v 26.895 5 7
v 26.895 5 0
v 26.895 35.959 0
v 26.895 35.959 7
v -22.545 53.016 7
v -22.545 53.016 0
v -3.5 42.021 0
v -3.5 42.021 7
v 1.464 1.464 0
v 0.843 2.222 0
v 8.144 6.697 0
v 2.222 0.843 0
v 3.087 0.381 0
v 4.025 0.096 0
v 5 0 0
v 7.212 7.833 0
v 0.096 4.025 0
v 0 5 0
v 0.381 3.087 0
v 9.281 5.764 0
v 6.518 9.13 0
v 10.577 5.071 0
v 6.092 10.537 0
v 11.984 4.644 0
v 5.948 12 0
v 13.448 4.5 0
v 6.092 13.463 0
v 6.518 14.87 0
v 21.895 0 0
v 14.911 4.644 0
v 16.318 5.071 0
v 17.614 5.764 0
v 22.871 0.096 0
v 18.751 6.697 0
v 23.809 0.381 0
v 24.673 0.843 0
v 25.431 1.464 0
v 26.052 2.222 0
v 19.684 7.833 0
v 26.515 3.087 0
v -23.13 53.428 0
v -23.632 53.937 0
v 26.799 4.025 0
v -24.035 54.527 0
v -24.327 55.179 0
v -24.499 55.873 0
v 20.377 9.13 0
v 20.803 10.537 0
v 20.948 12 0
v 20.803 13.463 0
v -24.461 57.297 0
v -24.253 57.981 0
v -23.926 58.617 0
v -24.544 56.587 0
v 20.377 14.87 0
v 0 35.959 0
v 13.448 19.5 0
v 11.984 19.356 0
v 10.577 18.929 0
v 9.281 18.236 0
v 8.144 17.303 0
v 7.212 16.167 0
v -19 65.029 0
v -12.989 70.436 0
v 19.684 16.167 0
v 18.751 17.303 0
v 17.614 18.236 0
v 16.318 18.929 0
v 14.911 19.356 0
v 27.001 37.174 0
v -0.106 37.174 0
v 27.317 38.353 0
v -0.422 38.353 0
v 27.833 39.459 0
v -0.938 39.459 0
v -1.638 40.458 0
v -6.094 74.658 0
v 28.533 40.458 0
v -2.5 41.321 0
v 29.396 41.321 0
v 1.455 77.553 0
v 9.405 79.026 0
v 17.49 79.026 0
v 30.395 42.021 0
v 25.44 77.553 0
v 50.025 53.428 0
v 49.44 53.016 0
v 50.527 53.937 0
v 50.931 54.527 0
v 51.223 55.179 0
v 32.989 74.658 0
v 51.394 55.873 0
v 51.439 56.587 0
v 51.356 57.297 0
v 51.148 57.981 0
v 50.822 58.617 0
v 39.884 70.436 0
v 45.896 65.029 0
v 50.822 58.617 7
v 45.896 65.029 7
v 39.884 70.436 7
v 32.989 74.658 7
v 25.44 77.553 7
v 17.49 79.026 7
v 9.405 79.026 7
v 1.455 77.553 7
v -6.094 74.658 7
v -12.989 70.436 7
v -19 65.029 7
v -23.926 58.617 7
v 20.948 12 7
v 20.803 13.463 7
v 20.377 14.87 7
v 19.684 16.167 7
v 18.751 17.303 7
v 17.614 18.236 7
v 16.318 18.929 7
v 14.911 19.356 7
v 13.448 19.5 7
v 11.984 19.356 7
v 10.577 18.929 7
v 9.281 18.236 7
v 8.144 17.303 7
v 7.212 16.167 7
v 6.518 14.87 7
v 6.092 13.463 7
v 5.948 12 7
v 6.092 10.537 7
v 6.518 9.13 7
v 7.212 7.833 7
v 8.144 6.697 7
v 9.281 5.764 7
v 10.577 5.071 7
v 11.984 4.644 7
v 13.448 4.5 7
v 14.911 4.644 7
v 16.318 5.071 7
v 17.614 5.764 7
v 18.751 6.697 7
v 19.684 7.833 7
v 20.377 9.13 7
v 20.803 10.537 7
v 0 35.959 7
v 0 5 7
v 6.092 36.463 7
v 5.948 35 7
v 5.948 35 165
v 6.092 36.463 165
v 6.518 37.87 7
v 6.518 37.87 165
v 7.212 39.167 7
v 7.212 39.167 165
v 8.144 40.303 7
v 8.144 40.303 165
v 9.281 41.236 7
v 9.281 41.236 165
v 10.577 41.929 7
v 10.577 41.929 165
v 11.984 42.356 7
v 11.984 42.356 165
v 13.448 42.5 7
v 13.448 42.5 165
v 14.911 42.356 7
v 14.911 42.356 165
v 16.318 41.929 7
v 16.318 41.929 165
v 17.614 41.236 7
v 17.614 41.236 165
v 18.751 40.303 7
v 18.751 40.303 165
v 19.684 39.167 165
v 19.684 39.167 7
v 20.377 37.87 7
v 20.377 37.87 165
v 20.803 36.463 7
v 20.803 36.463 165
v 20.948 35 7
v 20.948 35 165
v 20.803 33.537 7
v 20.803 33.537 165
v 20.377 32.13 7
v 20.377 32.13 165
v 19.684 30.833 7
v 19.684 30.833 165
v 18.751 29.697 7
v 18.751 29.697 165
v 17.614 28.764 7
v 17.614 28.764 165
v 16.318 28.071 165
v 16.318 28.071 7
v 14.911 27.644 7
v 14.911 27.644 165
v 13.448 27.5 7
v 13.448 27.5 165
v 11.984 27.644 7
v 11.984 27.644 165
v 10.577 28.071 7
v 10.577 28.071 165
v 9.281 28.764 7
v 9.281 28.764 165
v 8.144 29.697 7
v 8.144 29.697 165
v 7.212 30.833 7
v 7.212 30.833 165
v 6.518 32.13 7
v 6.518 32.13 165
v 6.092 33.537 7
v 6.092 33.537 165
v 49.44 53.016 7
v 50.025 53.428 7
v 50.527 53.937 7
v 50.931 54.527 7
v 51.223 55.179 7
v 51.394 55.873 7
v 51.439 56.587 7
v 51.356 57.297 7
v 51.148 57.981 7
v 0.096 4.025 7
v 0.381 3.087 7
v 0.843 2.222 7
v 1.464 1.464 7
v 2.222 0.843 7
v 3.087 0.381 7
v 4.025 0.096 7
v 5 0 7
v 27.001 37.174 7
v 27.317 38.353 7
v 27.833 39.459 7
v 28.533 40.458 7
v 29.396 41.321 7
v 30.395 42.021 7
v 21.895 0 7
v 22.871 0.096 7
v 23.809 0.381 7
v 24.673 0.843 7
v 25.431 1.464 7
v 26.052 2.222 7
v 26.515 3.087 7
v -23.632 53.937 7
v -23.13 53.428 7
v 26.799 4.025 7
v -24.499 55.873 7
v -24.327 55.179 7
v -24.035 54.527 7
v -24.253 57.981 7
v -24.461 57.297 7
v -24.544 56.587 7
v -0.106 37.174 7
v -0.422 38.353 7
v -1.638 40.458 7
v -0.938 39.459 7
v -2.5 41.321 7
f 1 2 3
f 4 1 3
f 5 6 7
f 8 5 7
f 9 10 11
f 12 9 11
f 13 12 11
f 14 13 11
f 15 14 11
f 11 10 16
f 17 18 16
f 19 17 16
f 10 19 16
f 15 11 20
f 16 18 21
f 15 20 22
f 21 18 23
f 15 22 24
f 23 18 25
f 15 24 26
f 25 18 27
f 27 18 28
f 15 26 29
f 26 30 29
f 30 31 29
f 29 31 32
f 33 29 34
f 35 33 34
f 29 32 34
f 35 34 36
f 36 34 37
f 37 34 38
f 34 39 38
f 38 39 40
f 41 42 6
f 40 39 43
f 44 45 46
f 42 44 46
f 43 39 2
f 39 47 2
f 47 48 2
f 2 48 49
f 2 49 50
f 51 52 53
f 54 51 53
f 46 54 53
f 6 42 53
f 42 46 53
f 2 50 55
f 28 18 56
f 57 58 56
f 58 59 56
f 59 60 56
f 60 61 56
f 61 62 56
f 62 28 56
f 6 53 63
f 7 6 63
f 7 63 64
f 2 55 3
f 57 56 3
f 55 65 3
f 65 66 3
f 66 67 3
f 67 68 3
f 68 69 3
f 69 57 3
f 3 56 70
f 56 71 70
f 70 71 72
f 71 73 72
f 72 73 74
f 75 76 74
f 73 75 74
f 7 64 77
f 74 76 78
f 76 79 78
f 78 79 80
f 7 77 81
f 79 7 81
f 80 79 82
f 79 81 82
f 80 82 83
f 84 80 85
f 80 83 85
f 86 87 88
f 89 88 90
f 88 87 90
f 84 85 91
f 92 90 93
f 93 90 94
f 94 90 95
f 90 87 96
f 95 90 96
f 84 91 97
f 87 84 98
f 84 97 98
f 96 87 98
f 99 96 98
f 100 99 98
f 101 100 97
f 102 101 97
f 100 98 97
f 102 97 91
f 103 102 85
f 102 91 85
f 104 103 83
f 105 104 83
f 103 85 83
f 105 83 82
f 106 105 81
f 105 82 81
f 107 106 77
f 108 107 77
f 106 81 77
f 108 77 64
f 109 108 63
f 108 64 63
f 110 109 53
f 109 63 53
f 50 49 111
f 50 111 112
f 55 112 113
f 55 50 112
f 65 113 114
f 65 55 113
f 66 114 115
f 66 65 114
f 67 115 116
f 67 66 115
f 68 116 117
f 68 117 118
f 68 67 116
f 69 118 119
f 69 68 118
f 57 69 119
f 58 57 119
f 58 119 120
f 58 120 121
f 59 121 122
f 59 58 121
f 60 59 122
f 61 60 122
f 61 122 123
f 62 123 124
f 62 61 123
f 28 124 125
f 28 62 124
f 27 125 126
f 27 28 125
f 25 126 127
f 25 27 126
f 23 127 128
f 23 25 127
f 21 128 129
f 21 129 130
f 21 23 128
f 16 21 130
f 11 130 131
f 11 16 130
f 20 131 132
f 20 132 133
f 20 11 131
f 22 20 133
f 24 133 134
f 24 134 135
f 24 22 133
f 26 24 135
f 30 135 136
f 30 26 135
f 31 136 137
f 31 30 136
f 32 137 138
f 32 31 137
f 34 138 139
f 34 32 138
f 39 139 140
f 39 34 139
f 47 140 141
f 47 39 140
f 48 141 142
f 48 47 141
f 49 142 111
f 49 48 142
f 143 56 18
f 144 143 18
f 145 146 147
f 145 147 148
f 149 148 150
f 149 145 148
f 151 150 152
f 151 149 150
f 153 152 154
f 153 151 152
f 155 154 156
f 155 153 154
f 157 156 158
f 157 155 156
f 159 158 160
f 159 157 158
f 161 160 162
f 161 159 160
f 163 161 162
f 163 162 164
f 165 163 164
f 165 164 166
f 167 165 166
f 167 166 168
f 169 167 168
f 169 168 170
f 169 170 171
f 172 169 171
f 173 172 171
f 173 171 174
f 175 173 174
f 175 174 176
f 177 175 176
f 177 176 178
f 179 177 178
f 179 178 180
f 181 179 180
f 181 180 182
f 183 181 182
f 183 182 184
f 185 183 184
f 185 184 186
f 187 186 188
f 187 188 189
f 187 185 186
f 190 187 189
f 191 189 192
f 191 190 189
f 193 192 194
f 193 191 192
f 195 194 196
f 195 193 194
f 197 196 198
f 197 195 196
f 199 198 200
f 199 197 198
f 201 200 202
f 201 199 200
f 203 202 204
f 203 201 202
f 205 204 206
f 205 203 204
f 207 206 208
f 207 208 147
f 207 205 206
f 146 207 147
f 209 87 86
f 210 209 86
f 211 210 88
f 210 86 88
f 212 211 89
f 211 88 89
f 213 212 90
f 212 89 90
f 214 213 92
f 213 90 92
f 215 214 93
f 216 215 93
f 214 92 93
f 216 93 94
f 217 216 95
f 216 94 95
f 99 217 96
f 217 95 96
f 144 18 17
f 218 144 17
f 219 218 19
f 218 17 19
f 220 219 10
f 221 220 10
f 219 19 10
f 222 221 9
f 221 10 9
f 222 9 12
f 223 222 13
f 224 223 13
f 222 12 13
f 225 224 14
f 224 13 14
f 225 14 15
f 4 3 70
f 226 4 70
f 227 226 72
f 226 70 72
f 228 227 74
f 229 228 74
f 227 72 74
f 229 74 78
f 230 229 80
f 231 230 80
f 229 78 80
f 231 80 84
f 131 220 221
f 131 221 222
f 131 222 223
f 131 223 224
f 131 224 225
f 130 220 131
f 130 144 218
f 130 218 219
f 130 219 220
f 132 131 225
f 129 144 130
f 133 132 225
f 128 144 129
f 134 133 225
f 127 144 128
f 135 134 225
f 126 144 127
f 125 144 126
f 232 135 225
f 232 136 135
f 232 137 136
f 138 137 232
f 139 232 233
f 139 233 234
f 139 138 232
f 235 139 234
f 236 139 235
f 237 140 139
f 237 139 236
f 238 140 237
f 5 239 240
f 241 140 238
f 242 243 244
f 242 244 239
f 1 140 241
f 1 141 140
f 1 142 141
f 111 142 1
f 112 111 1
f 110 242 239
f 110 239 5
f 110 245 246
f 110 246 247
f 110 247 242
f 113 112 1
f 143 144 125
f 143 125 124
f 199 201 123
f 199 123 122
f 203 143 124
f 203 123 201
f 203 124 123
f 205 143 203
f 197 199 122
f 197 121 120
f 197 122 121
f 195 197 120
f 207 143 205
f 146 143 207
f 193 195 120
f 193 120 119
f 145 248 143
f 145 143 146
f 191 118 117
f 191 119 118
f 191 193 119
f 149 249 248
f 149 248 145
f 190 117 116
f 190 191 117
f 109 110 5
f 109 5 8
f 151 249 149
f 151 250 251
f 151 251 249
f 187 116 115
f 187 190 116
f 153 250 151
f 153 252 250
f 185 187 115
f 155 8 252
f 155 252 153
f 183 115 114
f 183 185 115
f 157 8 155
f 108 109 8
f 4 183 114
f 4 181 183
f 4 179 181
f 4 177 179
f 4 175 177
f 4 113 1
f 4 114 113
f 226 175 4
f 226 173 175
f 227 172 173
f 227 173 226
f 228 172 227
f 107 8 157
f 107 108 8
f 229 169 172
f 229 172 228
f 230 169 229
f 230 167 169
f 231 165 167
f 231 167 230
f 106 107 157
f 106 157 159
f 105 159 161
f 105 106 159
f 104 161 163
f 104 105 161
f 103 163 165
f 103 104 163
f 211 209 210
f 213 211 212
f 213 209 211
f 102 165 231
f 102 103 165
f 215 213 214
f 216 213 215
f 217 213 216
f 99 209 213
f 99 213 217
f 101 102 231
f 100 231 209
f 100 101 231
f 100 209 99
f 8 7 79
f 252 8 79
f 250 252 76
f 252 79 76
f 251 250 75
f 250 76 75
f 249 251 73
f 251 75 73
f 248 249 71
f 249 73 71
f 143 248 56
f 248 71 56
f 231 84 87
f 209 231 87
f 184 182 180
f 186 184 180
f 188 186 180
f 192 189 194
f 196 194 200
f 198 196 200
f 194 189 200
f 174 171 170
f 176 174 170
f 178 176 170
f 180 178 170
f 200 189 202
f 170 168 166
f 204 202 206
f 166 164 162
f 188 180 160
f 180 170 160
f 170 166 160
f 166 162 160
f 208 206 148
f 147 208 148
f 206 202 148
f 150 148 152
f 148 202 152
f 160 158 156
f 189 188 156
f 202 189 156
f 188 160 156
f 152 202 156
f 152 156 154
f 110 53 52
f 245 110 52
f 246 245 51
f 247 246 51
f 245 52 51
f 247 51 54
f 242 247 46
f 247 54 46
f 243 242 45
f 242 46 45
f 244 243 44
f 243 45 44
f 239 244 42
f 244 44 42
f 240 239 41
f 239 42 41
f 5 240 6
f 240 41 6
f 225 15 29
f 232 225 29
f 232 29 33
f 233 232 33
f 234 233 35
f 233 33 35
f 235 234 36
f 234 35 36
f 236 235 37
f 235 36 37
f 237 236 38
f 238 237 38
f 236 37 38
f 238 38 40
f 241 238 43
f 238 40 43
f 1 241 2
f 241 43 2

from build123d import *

# Parameters (mm, degrees)
SKETCH2_R           = 7.5
BOSS_EXTRUDE5_DEPTH = 7
SKETCH5_R           = 7.5
BOSS_EXTRUDE6_DEPTH = 165


with BuildPart() as part:
    # Sketch2 → Boss-Extrude5 (new body)
    with BuildSketch(Plane.XY):
        with BuildLine():
            Line((5, 0), (21.89510984, 0))
            ThreePointArc((21.89510984, 0), (25.430643746, 1.464466094), (26.89510984, 5))
            Line((26.89510984, 5), (26.89510984, 35.958548116))
            ThreePointArc((26.89510984, 35.958548116), (27.832932013, 39.458548116), (30.39510984, 42.020725942))
            Line((30.39510984, 42.020725942), (49.440130583, 53.016373795))
            ThreePointArc((49.440130583, 53.016373795), (51.323745621, 55.522595335), (50.821570497, 58.61726368))
            ThreePointArc((50.821570497, 58.61726368), (13.44755492, 79.210770001), (-23.926460657, 58.61726368))
            ThreePointArc((-23.926460657, 58.61726368), (-24.428635781, 55.522595335), (-22.545020743, 53.016373795))
            Line((-22.545020743, 53.016373795), (-3.5, 42.020725942))
            ThreePointArc((-3.5, 42.020725942), (-0.937822174, 39.458548116), (0, 35.958548116))
            Line((0, 35.958548116), (0, 5))
            ThreePointArc((0, 5), (1.464466094, 1.464466094), (5, 0))
        make_face()
        with Locations((13.44755492, 35)):
            Circle(SKETCH2_R, mode=Mode.SUBTRACT)
        with Locations((13.44755492, 12)):
            Circle(SKETCH2_R, mode=Mode.SUBTRACT)
    extrude(amount=BOSS_EXTRUDE5_DEPTH)

    # Sketch5 → Boss-Extrude6 (add)
    with BuildSketch(Plane(origin=(0, 0, 0), x_dir=(-1, 0, 0), z_dir=(0, 0, -1))):
        with Locations((-13.44755492, 35)):
            Circle(SKETCH5_R)
    extrude(amount=-BOSS_EXTRUDE6_DEPTH)


solid = part.part
